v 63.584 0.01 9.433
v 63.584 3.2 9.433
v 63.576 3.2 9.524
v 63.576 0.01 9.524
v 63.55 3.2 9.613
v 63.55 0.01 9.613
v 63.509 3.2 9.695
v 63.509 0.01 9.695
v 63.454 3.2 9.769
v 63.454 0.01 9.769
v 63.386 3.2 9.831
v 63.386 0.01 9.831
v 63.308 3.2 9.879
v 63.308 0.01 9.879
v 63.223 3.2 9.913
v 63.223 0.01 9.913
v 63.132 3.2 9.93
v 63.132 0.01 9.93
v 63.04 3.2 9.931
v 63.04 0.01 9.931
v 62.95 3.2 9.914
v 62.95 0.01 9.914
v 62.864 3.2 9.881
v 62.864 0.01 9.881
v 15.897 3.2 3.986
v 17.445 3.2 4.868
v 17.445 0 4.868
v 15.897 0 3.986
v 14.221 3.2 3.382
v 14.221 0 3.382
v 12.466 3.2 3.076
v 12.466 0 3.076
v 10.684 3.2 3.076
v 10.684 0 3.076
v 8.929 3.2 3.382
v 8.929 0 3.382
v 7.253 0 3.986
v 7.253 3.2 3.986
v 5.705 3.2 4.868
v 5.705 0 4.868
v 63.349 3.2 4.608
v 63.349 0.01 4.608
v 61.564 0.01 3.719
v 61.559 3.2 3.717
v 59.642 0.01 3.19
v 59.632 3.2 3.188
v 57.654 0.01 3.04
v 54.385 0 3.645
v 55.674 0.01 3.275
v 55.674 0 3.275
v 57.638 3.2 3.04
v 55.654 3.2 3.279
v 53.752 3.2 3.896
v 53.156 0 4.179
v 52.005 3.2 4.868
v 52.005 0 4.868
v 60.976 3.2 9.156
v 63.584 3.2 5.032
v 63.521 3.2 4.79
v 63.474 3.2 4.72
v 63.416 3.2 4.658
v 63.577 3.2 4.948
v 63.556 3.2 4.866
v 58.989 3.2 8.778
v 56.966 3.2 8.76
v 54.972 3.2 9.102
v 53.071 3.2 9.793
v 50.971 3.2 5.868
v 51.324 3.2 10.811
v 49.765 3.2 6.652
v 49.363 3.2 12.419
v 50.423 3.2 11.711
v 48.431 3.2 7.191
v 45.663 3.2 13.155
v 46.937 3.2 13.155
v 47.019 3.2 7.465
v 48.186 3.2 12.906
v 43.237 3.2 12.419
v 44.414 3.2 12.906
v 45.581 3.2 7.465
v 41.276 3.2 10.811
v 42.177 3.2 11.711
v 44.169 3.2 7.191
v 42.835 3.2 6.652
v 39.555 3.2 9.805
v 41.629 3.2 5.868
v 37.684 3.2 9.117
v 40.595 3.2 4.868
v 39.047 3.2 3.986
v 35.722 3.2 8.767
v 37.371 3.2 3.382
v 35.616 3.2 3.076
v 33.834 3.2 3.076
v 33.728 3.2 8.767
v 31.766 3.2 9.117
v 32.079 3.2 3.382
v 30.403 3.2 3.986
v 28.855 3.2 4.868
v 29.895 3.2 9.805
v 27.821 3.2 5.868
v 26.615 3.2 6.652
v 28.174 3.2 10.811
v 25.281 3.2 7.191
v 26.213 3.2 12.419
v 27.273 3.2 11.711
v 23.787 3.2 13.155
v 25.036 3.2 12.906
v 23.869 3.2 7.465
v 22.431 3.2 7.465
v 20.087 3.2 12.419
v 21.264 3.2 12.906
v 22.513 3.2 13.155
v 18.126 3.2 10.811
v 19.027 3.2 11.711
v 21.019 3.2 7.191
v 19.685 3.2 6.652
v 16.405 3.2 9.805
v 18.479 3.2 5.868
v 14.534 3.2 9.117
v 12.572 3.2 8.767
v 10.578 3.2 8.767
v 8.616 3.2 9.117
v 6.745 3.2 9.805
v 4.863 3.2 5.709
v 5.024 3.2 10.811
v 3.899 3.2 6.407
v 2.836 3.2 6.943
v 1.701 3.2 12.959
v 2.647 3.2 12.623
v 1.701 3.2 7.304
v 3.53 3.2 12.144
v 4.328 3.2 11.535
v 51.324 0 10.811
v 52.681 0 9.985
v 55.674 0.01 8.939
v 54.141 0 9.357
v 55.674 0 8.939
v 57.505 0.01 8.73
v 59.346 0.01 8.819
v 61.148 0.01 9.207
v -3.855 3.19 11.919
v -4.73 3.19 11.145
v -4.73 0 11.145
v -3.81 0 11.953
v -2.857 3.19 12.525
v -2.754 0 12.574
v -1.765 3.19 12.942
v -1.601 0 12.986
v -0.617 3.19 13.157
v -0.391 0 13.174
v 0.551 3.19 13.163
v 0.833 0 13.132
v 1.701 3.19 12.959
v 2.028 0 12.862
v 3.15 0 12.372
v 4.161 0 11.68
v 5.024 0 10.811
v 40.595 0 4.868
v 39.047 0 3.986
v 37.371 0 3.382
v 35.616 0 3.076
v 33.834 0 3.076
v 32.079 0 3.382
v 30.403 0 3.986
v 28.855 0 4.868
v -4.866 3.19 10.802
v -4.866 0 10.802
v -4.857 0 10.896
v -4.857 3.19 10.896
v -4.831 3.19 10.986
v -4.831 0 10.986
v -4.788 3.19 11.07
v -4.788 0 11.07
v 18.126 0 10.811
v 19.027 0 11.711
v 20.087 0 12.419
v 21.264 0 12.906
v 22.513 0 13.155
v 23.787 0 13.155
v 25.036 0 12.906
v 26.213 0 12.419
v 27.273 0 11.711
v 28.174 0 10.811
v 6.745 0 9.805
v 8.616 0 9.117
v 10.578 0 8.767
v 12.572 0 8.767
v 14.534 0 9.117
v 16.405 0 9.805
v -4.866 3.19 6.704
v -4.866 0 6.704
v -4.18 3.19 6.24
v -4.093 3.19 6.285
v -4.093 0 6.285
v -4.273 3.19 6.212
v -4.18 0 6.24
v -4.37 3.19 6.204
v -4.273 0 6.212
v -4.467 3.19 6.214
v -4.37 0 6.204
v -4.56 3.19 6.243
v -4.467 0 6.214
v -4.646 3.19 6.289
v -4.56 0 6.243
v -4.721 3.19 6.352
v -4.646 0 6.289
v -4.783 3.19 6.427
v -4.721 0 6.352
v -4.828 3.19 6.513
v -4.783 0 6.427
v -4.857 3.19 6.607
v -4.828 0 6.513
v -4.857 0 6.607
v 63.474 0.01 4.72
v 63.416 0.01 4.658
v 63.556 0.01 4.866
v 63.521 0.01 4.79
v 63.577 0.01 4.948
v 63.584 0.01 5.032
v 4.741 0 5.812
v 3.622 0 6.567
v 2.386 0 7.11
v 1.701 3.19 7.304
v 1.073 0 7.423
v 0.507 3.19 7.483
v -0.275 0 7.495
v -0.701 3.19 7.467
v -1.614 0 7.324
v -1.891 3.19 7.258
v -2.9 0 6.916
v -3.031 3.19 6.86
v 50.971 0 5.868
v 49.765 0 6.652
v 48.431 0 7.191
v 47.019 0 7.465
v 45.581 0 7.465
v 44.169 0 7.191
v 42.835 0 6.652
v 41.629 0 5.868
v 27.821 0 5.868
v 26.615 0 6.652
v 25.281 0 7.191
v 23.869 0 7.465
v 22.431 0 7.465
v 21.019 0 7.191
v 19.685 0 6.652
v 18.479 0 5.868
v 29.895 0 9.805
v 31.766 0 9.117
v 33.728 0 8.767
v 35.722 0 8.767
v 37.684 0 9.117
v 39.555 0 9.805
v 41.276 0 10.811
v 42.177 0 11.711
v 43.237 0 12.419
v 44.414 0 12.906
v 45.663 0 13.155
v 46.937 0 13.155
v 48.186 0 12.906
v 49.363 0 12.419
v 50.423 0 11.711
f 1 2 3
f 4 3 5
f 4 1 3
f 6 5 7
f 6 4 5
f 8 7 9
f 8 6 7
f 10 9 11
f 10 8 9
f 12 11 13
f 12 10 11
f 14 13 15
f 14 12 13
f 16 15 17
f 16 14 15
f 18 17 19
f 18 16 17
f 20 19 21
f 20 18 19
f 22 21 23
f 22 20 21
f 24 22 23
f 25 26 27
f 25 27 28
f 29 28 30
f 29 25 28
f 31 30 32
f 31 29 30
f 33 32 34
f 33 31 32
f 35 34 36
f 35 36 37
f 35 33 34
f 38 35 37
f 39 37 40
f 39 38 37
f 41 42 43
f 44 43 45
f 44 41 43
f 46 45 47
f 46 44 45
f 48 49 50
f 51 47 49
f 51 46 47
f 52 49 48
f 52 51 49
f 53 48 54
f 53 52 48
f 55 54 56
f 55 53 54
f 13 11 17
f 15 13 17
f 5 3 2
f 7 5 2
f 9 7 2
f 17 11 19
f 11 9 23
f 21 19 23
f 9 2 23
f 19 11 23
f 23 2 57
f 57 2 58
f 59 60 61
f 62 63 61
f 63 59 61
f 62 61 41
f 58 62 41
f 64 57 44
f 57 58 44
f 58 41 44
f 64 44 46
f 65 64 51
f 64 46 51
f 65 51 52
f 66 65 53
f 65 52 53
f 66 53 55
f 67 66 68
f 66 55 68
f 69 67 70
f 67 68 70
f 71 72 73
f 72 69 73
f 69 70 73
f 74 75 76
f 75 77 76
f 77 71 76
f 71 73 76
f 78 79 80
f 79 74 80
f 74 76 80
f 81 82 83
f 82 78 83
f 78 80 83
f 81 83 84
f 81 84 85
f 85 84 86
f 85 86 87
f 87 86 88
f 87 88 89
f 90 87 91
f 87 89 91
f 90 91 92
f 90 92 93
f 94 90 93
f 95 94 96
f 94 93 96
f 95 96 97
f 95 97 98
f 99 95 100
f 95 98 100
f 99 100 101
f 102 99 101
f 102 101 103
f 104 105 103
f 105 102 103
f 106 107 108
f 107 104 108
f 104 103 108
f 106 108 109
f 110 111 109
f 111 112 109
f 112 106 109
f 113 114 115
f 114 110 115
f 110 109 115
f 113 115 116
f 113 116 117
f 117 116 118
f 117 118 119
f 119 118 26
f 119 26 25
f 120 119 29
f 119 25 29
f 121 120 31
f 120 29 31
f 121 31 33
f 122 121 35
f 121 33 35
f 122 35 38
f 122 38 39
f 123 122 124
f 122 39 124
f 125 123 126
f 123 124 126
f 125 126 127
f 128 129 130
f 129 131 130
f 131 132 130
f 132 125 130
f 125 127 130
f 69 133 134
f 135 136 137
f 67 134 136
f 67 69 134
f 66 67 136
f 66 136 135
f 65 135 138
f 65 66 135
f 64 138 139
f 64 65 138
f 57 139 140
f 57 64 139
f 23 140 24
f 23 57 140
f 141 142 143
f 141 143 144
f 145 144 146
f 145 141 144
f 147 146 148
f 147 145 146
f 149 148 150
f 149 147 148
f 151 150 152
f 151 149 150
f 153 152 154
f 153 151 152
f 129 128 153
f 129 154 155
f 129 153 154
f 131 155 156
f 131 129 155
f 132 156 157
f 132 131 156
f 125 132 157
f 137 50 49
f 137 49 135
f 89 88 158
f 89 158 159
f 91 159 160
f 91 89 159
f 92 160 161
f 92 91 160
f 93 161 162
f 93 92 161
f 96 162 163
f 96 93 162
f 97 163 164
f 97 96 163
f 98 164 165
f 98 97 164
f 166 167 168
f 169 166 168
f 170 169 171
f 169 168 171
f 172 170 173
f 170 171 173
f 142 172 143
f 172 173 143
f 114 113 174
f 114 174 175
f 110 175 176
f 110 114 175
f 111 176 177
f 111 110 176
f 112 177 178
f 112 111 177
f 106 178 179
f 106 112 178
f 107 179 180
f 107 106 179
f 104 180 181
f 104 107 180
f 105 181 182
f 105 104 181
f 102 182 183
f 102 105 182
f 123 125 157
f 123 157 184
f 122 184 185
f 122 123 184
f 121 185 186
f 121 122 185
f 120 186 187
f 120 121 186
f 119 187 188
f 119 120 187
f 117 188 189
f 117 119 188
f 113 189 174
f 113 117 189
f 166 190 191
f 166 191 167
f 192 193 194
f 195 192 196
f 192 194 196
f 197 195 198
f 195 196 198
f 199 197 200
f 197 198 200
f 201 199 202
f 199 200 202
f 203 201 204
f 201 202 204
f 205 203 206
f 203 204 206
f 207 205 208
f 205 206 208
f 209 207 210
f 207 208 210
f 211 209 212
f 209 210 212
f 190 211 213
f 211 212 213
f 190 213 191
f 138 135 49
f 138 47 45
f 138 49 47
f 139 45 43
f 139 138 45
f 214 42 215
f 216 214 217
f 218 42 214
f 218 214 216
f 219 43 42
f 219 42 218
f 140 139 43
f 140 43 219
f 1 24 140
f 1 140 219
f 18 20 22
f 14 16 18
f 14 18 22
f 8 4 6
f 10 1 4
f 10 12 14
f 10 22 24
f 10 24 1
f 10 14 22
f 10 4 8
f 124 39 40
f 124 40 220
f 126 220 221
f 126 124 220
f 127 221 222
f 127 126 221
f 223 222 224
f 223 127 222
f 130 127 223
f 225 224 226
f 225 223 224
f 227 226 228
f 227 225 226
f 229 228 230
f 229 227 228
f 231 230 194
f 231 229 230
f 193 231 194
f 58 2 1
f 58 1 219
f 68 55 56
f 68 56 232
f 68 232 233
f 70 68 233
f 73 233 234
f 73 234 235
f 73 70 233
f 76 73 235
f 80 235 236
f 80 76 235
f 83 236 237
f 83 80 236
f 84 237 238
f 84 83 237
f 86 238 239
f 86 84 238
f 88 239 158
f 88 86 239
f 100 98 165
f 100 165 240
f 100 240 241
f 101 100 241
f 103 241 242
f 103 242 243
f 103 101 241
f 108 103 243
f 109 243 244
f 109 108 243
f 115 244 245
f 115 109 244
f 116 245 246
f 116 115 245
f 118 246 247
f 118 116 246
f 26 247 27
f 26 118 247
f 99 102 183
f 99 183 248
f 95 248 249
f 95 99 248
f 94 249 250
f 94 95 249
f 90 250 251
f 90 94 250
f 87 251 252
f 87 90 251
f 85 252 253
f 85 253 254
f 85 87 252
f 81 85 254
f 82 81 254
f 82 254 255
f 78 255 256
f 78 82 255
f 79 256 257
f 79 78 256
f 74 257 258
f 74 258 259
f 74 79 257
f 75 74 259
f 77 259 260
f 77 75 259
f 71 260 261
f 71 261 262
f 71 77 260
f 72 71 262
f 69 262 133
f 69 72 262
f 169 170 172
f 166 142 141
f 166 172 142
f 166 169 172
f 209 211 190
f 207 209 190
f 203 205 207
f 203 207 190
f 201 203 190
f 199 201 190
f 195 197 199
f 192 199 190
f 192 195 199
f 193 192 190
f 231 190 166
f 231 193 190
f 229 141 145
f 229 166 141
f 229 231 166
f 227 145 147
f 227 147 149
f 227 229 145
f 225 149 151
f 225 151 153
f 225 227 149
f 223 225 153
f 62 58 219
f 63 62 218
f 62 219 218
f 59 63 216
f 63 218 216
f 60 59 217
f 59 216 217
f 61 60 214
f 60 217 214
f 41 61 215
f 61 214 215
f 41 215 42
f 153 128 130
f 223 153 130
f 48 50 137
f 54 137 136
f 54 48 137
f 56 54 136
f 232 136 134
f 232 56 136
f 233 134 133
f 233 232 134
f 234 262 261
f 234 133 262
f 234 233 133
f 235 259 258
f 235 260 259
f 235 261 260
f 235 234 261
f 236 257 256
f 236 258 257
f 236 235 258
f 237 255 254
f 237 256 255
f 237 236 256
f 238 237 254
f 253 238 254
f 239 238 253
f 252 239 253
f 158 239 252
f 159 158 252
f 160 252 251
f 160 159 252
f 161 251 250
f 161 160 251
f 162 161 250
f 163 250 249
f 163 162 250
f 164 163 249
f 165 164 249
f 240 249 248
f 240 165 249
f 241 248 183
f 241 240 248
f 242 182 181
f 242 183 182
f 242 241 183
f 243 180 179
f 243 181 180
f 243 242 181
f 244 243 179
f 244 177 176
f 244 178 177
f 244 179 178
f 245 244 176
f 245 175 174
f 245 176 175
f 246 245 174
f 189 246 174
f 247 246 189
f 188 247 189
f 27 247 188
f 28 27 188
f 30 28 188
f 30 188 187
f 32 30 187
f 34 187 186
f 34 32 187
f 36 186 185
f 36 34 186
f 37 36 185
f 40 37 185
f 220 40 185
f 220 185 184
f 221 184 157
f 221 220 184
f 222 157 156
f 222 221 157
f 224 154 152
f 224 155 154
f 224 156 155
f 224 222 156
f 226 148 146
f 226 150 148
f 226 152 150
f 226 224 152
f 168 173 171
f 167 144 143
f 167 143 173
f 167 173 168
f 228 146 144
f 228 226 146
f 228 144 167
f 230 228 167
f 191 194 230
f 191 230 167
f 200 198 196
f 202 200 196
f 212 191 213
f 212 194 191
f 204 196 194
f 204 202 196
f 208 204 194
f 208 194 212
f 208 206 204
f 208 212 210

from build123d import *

# Parameters (mm, degrees)
BOSS_EXTRUDE1_DEPTH = 3.2
SKETCH2_W           = 75.494873271
SKETCH2_H           = 16.574066579
CUT_EXTRUDE1_DEPTH  = 3.2
FILLET1_R           = 0.5
SKETCH3_W           = 8.055614235
SKETCH3_H           = 25.854685688
CUT_EXTRUDE2_DEPTH  = 0.01
SKETCH4_W           = 14.500105624
SKETCH4_H           = 31.26063467
CUT_EXTRUDE3_DEPTH  = 0.01


with BuildPart() as part:
    # Sketch1 → Boss-Extrude1 (new body)
    with BuildSketch(Plane(origin=(0, 0, 0), x_dir=(1, 0, 0), z_dir=(0, 1, 0))):
        with BuildLine():
            ThreePointArc((51.666035076, -4.495071474), (57.875, -2.537392354), (64.083964924, -4.495071474))
            Line((64.083964924, -4.495071474), (64.083964924, -11.181167218))
            ThreePointArc((64.083964924, -11.181167218), (57.875, -9.223488098), (51.666035076, -11.181167218))
            ThreePointArc((51.666035076, -11.181167218), (46.3, -13.686095744), (40.933964924, -11.181167218))
            ThreePointArc((40.933964924, -11.181167218), (34.725, -9.223488098), (28.516035077, -11.181167218))
            ThreePointArc((28.516035077, -11.181167218), (23.15, -13.686095744), (17.783964924, -11.181167218))
            ThreePointArc((17.783964924, -11.181167218), (11.575, -9.223488098), (5.366035077, -11.181167218))
            ThreePointArc((5.366035077, -11.181167218), (0, -13.686095744), (-5.366035076, -11.181167218))
            Line((-5.366035076, -11.181167218), (-5.366035076, -4.495071474))
            ThreePointArc((-5.366035076, -4.495071474), (0, -7), (5.366035076, -4.495071474))
            ThreePointArc((5.366035076, -4.495071474), (11.575, -2.537392354), (17.783964924, -4.495071474))
            ThreePointArc((17.783964924, -4.495071474), (23.15, -7), (28.516035076, -4.495071474))
            ThreePointArc((28.516035076, -4.495071474), (34.725, -2.537392354), (40.933964924, -4.495071474))
            ThreePointArc((40.933964924, -4.495071474), (46.3, -7), (51.666035076, -4.495071474))
        make_face()
    extrude(amount=BOSS_EXTRUDE1_DEPTH)

    # Sketch2 → Cut-Extrude1 (cut)
    with BuildSketch(Plane(origin=(0, 3.2, 0), x_dir=(1, 0, 0), z_dir=(0, 1, 0))):
        with Locations((29.270514079, -6.984979931)):
            Rectangle(SKETCH2_W, SKETCH2_H)
        with BuildLine():
            Line((63.583964924, -10.267724094), (63.583964924, -4.759291488))
            ThreePointArc((63.583964924, -4.759291488), (57.778030808, -3.037847716), (52.005454008, -4.868038061))
            ThreePointArc((52.005454008, -4.868038061), (46.3, -7.5), (40.594545992, -4.868038061))
            ThreePointArc((40.594545992, -4.868038061), (34.725, -3.037392354), (28.855454008, -4.868038061))
            ThreePointArc((28.855454008, -4.868038061), (23.15, -7.5), (17.444545992, -4.868038061))
            ThreePointArc((17.444545992, -4.868038061), (11.575, -3.037392354), (5.705454008, -4.868038061))
            ThreePointArc((5.705454008, -4.868038061), (0.593454673, -7.476483903), (-4.866035076, -5.707162398))
            Line((-4.866035076, -5.707162398), (-4.866035076, -10.995585579))
            ThreePointArc((-4.866035076, -10.995585579), (0.121449449, -13.184961032), (5.023650974, -10.810769172))
            ThreePointArc((5.023650974, -10.810769172), (11.575, -8.723488098), (18.126349026, -10.810769172))
            ThreePointArc((18.126349026, -10.810769172), (23.15, -13.186095744), (28.173650974, -10.810769172))
            ThreePointArc((28.173650974, -10.810769172), (34.725, -8.723488098), (41.276349026, -10.810769172))
            ThreePointArc((41.276349026, -10.810769172), (46.3, -13.186095744), (51.323650974, -10.810769172))
            ThreePointArc((51.323650974, -10.810769172), (57.373874034, -8.734580825), (63.583964924, -10.267724094))
        make_face(mode=Mode.SUBTRACT)
    extrude(amount=-CUT_EXTRUDE1_DEPTH, mode=Mode.SUBTRACT)

    # Fillet1
    fillet1_edges = [part.edges().sort_by_distance(p)[0] for p in [
        (63.583964924, 1.6, 10.267724094),
        (63.583964924, 1.6, 4.759291488),
        (-4.866035076, 1.6, 5.707162398),
        (-4.866035076, 1.6, 10.995585579),
    ]]
    fillet(fillet1_edges, radius=FILLET1_R)

    # Sketch3 → Cut-Extrude2 (cut)
    with BuildSketch(Plane.XZ):
        with Locations((59.701778543, 14.32607503)):
            Rectangle(SKETCH3_W, SKETCH3_H)
    extrude(amount=-CUT_EXTRUDE2_DEPTH, mode=Mode.SUBTRACT)

    # Sketch4 → Cut-Extrude3 (cut)
    with BuildSketch(Plane(origin=(0, 3.2, 0), x_dir=(1, 0, 0), z_dir=(0, 1, 0))):
        with Locations((-5.548696762, 0)):
            Rectangle(SKETCH4_W, SKETCH4_H)
    extrude(amount=-CUT_EXTRUDE3_DEPTH, mode=Mode.SUBTRACT)


solid = part.part
